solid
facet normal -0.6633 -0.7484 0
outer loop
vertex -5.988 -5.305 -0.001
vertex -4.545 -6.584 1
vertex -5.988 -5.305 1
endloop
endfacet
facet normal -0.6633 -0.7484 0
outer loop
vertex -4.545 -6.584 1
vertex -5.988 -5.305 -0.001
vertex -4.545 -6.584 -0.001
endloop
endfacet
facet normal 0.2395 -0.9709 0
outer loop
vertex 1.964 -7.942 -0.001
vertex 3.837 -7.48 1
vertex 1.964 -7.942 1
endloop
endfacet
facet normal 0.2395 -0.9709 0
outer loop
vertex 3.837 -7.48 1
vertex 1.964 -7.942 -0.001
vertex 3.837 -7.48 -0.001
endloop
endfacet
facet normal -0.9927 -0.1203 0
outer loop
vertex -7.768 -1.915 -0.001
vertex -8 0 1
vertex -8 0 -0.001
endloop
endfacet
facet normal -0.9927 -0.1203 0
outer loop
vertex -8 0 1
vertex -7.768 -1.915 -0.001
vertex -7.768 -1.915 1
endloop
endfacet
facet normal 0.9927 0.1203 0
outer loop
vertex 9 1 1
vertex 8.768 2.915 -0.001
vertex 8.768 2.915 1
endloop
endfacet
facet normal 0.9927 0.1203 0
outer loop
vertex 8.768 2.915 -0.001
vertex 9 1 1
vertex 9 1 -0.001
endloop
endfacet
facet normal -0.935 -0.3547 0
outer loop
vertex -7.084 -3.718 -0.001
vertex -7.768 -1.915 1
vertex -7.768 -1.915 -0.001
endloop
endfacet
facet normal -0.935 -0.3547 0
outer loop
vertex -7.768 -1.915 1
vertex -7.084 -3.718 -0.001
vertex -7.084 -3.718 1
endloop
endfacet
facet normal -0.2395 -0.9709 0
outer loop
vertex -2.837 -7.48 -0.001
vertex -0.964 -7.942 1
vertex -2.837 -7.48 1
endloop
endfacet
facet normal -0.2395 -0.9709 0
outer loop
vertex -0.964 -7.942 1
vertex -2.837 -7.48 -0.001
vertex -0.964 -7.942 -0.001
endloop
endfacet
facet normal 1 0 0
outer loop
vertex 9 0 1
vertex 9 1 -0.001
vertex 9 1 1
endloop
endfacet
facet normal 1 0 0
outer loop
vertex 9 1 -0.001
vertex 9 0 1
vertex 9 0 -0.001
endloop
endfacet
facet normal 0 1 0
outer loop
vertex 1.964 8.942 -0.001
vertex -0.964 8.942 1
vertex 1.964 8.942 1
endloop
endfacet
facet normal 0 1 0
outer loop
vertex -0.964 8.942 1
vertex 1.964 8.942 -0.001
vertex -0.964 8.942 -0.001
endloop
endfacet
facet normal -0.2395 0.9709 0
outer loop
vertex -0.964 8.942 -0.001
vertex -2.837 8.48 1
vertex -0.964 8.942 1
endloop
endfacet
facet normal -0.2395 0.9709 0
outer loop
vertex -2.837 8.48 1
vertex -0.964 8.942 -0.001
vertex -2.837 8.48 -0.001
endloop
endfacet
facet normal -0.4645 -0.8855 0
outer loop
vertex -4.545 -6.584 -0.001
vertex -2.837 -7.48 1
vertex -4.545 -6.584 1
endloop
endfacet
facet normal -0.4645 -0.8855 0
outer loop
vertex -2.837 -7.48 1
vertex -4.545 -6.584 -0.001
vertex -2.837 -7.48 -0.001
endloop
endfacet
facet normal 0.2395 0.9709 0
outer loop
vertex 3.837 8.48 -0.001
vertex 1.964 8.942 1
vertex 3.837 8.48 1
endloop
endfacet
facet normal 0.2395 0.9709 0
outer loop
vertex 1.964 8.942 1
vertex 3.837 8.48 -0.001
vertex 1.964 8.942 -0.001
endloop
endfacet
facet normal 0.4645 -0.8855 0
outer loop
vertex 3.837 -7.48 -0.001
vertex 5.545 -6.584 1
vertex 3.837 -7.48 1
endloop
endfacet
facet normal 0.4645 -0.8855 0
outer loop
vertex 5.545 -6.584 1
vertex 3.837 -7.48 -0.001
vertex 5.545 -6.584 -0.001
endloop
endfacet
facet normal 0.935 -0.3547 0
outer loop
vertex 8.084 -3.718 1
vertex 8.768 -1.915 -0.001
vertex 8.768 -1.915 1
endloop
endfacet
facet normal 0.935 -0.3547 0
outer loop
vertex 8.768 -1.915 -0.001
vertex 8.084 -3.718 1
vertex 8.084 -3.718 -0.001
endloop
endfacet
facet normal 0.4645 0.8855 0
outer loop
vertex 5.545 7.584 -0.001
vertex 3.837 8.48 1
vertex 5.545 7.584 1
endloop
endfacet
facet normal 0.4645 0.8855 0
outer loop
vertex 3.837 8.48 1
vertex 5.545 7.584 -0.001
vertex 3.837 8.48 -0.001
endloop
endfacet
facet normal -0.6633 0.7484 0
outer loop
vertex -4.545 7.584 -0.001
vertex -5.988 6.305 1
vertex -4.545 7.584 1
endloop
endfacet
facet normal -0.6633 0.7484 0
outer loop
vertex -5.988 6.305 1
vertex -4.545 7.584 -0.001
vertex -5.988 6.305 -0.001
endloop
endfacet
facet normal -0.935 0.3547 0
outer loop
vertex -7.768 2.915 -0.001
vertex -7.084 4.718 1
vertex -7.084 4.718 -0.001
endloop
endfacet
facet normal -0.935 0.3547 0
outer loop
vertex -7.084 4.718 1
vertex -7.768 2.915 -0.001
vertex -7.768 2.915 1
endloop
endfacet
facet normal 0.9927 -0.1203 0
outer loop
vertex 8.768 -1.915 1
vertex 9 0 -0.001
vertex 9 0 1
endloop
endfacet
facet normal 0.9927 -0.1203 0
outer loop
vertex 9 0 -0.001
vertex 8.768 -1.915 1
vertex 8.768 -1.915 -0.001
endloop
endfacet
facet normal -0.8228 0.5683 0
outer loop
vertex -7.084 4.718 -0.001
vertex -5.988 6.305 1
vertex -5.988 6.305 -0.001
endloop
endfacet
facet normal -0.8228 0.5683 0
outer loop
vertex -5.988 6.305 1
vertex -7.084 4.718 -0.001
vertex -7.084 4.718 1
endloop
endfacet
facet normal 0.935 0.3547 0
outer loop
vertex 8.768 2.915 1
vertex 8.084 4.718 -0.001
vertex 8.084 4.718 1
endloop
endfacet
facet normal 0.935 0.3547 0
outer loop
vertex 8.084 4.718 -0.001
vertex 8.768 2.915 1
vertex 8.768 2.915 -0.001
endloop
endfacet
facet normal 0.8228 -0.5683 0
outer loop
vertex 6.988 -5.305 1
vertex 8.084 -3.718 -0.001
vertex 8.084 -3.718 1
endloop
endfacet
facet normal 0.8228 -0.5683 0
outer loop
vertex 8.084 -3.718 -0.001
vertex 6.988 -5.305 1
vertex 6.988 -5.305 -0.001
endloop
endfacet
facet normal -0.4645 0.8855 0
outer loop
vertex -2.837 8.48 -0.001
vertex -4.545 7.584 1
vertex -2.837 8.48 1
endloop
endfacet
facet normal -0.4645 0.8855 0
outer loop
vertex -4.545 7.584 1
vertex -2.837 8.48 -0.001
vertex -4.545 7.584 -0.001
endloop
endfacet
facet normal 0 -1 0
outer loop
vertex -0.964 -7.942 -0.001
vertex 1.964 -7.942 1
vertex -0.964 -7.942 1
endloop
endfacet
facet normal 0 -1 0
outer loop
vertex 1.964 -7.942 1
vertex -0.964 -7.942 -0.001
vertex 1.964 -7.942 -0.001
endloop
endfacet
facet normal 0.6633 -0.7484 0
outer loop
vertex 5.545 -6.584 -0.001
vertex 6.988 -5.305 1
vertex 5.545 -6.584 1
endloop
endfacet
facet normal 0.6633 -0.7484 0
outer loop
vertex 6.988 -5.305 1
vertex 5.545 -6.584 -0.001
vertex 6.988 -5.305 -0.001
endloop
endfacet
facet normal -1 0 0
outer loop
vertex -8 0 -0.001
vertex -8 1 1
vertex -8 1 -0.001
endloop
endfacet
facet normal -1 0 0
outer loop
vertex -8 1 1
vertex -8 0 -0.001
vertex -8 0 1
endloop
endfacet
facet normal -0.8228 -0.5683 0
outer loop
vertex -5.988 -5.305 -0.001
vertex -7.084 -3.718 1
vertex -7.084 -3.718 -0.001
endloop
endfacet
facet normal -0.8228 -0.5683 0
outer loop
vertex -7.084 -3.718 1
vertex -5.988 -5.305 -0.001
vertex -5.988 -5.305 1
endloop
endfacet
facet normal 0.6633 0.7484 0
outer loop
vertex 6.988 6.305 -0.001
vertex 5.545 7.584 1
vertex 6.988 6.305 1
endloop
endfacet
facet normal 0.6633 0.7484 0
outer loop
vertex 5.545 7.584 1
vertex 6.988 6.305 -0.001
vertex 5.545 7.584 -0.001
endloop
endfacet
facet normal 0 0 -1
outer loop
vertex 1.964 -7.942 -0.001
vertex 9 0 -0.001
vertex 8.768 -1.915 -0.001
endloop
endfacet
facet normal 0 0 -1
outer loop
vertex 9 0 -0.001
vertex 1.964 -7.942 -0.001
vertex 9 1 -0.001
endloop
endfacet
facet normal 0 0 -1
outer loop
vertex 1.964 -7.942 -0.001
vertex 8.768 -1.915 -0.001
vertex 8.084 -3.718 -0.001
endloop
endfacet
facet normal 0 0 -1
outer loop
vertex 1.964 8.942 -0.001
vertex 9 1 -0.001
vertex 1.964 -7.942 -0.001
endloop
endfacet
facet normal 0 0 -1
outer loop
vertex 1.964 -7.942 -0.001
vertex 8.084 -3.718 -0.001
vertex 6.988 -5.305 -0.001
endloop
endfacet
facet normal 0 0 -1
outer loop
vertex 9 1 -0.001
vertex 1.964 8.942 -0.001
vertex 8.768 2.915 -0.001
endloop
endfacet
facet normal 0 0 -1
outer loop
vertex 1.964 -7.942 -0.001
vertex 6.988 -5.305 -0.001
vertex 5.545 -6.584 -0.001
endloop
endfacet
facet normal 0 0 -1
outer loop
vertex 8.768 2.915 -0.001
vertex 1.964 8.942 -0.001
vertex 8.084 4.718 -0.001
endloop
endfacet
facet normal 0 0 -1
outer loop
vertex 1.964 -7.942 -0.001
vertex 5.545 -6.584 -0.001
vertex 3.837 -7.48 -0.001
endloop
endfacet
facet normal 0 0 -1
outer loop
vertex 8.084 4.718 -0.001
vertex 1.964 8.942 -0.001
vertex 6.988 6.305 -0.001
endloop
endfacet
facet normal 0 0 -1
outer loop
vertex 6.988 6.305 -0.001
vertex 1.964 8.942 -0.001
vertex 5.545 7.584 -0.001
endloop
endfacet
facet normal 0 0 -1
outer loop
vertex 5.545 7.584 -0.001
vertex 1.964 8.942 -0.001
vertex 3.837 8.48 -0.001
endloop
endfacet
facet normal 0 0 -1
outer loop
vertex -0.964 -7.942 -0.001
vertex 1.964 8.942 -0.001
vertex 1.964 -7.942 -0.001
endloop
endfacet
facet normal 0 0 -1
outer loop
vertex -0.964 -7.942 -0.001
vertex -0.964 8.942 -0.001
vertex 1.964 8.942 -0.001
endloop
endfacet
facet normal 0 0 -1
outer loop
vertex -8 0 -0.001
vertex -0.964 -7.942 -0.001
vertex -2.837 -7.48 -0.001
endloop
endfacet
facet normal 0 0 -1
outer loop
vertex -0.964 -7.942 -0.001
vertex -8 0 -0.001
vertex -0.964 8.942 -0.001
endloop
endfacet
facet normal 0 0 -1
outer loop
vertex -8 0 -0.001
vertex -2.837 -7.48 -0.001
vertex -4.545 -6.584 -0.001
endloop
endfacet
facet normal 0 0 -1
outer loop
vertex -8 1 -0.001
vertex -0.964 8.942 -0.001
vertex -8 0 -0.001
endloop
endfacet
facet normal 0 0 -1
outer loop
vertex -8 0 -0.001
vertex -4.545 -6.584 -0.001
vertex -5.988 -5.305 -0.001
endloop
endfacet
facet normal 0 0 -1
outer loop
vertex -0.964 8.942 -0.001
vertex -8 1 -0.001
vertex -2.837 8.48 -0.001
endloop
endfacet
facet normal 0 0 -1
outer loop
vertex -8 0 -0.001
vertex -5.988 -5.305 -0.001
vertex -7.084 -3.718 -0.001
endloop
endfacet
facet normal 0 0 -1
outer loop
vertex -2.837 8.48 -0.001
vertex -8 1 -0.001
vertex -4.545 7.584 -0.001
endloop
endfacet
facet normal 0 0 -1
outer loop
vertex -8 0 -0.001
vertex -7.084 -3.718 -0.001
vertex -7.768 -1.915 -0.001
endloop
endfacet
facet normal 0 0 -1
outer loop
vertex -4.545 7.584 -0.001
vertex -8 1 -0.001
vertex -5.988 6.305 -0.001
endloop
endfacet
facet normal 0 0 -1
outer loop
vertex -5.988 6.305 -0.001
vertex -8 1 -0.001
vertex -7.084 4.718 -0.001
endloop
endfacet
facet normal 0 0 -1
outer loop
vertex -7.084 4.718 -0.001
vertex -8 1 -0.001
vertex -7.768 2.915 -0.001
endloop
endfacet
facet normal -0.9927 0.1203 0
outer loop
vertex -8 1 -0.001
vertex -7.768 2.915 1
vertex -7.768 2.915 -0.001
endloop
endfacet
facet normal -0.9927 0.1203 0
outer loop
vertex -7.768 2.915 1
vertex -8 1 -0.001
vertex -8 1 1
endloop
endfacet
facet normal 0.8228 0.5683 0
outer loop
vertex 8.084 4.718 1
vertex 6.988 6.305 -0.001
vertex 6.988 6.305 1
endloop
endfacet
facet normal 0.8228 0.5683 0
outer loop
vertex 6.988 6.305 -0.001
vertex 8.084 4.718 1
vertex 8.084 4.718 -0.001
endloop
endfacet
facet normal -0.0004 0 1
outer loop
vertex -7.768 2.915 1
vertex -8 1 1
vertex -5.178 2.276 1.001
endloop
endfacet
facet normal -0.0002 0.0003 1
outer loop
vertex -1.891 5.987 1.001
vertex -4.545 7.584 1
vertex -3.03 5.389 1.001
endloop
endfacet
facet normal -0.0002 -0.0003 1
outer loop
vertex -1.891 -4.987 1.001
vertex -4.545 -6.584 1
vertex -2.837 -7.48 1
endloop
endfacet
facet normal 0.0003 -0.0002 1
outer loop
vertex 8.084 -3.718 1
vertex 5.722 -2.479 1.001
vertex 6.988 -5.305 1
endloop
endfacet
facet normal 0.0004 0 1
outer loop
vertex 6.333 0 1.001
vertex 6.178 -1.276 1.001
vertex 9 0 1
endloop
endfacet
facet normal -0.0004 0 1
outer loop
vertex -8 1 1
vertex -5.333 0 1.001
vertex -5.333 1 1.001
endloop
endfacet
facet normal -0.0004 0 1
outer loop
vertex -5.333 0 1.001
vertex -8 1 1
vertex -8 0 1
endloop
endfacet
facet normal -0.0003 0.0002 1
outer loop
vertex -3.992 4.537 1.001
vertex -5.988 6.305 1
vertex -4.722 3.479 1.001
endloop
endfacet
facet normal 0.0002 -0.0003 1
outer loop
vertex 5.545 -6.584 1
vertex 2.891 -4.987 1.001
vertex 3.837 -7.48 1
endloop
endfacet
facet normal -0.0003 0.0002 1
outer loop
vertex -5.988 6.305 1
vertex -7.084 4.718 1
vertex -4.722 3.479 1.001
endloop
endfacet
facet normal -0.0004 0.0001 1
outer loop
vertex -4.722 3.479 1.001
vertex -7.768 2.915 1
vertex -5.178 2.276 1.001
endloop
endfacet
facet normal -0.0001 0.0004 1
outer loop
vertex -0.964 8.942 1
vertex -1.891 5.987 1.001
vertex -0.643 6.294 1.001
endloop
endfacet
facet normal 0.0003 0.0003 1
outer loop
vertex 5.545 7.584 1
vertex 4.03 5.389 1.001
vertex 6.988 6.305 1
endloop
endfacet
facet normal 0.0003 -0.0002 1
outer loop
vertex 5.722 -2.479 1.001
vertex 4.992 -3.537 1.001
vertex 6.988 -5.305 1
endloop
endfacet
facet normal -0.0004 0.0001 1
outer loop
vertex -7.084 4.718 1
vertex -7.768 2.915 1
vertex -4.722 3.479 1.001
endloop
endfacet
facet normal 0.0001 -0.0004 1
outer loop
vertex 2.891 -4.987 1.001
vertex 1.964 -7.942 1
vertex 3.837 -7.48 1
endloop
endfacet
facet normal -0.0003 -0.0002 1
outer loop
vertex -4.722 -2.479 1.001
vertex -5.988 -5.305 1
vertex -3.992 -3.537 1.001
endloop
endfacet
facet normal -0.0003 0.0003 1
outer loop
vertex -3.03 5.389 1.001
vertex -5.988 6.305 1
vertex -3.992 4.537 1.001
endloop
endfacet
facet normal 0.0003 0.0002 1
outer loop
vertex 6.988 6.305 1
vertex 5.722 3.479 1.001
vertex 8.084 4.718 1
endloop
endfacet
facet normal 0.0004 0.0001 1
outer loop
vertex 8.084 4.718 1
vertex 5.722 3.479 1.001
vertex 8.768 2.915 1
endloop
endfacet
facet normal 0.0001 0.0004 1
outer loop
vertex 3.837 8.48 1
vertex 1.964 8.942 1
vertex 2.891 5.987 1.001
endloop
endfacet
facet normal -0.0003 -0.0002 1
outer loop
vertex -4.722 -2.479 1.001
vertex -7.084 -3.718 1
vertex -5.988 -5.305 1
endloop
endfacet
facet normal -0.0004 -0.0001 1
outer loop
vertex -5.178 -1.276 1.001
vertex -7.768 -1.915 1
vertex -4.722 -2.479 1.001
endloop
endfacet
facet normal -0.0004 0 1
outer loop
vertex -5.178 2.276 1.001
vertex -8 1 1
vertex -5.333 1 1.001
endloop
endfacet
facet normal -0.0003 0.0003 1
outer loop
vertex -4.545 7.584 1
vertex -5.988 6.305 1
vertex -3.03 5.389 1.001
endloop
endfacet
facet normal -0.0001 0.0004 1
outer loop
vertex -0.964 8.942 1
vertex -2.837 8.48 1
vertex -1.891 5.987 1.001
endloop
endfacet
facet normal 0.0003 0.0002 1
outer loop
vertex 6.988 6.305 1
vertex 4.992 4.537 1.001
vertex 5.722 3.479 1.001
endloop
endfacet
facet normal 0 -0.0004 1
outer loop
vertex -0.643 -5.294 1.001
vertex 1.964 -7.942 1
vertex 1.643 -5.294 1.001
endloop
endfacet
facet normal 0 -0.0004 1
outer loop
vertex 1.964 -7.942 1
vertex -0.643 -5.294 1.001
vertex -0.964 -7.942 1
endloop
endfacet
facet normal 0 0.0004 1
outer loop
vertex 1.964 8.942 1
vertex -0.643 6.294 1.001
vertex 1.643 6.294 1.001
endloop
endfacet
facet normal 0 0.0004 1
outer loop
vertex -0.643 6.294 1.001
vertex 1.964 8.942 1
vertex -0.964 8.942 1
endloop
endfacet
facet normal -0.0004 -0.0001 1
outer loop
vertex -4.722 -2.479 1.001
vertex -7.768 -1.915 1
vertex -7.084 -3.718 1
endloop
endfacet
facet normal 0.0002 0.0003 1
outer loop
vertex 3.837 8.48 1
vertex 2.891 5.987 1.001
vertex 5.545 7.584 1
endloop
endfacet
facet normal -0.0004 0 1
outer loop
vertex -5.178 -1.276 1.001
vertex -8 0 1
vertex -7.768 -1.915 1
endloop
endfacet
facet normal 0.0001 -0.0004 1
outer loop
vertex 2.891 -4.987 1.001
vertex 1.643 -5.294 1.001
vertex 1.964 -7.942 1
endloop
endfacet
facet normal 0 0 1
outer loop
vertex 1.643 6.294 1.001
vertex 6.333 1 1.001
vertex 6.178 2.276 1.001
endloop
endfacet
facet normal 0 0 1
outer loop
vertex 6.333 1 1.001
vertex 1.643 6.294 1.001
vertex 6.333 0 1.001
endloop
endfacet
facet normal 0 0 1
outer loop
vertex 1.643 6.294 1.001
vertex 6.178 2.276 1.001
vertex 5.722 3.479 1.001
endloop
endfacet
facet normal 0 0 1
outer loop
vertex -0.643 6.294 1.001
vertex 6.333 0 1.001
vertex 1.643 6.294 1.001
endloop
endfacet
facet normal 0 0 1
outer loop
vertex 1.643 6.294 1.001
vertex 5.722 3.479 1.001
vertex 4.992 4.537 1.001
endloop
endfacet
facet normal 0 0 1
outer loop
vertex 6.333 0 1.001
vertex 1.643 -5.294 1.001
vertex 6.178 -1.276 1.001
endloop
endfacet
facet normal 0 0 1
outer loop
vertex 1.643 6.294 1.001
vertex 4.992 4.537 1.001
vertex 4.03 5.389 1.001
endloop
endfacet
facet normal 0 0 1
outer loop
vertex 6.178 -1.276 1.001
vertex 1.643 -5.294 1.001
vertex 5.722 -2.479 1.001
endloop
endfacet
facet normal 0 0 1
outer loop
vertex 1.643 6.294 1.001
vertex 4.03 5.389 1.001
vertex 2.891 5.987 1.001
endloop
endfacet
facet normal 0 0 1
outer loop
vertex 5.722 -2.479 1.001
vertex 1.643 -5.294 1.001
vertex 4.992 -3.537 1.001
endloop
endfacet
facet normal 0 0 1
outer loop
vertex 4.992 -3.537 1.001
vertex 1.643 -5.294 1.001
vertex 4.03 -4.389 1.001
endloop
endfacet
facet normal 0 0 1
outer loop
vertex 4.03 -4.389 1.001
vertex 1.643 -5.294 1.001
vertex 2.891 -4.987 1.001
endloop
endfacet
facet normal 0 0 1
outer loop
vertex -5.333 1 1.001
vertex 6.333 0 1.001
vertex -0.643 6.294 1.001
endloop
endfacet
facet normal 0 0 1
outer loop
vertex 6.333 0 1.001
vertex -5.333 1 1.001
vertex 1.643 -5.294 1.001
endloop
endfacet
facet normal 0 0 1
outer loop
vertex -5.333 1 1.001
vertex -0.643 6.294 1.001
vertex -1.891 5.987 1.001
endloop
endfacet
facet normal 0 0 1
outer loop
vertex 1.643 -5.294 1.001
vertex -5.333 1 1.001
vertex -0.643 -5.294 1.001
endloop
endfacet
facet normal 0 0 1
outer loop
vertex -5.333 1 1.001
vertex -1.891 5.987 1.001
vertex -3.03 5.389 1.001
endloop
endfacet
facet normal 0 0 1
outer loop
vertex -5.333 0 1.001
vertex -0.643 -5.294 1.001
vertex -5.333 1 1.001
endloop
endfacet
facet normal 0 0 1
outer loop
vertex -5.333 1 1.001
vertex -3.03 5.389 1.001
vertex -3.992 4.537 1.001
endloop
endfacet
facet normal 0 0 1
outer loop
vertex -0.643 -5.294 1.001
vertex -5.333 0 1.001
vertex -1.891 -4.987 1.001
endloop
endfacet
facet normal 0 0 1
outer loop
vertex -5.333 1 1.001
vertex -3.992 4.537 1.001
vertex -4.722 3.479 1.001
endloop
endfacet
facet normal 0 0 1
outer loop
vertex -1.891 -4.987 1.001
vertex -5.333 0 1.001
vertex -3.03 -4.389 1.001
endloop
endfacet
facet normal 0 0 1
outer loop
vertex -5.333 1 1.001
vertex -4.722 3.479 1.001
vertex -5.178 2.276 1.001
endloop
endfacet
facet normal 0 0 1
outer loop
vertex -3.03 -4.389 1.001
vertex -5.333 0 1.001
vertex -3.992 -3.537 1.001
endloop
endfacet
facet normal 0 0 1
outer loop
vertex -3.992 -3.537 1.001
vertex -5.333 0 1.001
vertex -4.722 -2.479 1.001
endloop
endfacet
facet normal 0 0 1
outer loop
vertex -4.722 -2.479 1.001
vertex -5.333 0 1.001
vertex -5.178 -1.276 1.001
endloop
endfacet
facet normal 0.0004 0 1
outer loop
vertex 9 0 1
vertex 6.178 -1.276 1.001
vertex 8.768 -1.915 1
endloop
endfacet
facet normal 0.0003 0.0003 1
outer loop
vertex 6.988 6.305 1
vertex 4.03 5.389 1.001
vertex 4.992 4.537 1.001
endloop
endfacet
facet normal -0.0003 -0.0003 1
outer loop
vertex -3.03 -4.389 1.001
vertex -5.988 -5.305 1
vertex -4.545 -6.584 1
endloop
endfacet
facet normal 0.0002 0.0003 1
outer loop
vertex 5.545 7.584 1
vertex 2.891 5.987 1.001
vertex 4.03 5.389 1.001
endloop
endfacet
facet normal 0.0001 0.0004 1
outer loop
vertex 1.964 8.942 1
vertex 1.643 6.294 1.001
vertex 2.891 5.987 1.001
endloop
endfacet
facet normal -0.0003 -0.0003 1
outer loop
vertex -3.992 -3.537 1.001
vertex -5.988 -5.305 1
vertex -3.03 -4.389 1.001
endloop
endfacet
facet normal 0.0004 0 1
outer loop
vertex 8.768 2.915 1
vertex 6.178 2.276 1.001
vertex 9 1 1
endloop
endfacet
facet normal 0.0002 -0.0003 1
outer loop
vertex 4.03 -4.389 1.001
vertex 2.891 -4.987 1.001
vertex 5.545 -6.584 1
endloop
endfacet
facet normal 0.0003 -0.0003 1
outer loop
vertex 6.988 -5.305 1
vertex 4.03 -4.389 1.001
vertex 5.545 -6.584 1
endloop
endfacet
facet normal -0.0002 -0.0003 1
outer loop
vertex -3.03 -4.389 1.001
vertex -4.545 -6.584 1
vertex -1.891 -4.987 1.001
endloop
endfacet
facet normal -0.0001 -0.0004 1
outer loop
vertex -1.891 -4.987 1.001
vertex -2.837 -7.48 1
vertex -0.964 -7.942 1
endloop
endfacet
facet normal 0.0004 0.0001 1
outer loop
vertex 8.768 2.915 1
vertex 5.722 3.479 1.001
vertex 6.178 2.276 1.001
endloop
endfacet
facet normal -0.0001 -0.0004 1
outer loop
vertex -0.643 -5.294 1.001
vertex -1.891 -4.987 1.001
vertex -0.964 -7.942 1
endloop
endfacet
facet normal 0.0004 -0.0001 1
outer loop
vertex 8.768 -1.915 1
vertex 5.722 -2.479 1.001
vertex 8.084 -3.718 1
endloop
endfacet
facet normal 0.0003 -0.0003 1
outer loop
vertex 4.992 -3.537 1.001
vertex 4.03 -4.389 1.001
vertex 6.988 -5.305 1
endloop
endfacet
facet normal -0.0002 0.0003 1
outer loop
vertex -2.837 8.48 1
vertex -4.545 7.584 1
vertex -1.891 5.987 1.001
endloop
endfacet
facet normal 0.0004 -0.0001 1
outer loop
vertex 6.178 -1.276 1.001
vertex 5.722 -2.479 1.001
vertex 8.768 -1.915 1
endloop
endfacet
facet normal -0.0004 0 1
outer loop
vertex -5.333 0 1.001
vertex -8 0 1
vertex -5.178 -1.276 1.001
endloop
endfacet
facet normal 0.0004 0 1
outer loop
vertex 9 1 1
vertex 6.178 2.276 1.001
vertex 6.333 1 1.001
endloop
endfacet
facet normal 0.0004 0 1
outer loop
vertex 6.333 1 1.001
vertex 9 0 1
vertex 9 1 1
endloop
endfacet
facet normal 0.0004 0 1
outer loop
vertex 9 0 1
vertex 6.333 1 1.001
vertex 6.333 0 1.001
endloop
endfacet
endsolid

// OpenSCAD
minkowski() {
  union() {
    linear_extrude(0.001, scale=0.6666667) {
      circle(r=8);
    }
    translate([0, 0, -0.001]) {
      linear_extrude(0.001, scale=0.75) {
        circle(r=8);
      }
    }
  }
  cube([1,1,1]);
}
